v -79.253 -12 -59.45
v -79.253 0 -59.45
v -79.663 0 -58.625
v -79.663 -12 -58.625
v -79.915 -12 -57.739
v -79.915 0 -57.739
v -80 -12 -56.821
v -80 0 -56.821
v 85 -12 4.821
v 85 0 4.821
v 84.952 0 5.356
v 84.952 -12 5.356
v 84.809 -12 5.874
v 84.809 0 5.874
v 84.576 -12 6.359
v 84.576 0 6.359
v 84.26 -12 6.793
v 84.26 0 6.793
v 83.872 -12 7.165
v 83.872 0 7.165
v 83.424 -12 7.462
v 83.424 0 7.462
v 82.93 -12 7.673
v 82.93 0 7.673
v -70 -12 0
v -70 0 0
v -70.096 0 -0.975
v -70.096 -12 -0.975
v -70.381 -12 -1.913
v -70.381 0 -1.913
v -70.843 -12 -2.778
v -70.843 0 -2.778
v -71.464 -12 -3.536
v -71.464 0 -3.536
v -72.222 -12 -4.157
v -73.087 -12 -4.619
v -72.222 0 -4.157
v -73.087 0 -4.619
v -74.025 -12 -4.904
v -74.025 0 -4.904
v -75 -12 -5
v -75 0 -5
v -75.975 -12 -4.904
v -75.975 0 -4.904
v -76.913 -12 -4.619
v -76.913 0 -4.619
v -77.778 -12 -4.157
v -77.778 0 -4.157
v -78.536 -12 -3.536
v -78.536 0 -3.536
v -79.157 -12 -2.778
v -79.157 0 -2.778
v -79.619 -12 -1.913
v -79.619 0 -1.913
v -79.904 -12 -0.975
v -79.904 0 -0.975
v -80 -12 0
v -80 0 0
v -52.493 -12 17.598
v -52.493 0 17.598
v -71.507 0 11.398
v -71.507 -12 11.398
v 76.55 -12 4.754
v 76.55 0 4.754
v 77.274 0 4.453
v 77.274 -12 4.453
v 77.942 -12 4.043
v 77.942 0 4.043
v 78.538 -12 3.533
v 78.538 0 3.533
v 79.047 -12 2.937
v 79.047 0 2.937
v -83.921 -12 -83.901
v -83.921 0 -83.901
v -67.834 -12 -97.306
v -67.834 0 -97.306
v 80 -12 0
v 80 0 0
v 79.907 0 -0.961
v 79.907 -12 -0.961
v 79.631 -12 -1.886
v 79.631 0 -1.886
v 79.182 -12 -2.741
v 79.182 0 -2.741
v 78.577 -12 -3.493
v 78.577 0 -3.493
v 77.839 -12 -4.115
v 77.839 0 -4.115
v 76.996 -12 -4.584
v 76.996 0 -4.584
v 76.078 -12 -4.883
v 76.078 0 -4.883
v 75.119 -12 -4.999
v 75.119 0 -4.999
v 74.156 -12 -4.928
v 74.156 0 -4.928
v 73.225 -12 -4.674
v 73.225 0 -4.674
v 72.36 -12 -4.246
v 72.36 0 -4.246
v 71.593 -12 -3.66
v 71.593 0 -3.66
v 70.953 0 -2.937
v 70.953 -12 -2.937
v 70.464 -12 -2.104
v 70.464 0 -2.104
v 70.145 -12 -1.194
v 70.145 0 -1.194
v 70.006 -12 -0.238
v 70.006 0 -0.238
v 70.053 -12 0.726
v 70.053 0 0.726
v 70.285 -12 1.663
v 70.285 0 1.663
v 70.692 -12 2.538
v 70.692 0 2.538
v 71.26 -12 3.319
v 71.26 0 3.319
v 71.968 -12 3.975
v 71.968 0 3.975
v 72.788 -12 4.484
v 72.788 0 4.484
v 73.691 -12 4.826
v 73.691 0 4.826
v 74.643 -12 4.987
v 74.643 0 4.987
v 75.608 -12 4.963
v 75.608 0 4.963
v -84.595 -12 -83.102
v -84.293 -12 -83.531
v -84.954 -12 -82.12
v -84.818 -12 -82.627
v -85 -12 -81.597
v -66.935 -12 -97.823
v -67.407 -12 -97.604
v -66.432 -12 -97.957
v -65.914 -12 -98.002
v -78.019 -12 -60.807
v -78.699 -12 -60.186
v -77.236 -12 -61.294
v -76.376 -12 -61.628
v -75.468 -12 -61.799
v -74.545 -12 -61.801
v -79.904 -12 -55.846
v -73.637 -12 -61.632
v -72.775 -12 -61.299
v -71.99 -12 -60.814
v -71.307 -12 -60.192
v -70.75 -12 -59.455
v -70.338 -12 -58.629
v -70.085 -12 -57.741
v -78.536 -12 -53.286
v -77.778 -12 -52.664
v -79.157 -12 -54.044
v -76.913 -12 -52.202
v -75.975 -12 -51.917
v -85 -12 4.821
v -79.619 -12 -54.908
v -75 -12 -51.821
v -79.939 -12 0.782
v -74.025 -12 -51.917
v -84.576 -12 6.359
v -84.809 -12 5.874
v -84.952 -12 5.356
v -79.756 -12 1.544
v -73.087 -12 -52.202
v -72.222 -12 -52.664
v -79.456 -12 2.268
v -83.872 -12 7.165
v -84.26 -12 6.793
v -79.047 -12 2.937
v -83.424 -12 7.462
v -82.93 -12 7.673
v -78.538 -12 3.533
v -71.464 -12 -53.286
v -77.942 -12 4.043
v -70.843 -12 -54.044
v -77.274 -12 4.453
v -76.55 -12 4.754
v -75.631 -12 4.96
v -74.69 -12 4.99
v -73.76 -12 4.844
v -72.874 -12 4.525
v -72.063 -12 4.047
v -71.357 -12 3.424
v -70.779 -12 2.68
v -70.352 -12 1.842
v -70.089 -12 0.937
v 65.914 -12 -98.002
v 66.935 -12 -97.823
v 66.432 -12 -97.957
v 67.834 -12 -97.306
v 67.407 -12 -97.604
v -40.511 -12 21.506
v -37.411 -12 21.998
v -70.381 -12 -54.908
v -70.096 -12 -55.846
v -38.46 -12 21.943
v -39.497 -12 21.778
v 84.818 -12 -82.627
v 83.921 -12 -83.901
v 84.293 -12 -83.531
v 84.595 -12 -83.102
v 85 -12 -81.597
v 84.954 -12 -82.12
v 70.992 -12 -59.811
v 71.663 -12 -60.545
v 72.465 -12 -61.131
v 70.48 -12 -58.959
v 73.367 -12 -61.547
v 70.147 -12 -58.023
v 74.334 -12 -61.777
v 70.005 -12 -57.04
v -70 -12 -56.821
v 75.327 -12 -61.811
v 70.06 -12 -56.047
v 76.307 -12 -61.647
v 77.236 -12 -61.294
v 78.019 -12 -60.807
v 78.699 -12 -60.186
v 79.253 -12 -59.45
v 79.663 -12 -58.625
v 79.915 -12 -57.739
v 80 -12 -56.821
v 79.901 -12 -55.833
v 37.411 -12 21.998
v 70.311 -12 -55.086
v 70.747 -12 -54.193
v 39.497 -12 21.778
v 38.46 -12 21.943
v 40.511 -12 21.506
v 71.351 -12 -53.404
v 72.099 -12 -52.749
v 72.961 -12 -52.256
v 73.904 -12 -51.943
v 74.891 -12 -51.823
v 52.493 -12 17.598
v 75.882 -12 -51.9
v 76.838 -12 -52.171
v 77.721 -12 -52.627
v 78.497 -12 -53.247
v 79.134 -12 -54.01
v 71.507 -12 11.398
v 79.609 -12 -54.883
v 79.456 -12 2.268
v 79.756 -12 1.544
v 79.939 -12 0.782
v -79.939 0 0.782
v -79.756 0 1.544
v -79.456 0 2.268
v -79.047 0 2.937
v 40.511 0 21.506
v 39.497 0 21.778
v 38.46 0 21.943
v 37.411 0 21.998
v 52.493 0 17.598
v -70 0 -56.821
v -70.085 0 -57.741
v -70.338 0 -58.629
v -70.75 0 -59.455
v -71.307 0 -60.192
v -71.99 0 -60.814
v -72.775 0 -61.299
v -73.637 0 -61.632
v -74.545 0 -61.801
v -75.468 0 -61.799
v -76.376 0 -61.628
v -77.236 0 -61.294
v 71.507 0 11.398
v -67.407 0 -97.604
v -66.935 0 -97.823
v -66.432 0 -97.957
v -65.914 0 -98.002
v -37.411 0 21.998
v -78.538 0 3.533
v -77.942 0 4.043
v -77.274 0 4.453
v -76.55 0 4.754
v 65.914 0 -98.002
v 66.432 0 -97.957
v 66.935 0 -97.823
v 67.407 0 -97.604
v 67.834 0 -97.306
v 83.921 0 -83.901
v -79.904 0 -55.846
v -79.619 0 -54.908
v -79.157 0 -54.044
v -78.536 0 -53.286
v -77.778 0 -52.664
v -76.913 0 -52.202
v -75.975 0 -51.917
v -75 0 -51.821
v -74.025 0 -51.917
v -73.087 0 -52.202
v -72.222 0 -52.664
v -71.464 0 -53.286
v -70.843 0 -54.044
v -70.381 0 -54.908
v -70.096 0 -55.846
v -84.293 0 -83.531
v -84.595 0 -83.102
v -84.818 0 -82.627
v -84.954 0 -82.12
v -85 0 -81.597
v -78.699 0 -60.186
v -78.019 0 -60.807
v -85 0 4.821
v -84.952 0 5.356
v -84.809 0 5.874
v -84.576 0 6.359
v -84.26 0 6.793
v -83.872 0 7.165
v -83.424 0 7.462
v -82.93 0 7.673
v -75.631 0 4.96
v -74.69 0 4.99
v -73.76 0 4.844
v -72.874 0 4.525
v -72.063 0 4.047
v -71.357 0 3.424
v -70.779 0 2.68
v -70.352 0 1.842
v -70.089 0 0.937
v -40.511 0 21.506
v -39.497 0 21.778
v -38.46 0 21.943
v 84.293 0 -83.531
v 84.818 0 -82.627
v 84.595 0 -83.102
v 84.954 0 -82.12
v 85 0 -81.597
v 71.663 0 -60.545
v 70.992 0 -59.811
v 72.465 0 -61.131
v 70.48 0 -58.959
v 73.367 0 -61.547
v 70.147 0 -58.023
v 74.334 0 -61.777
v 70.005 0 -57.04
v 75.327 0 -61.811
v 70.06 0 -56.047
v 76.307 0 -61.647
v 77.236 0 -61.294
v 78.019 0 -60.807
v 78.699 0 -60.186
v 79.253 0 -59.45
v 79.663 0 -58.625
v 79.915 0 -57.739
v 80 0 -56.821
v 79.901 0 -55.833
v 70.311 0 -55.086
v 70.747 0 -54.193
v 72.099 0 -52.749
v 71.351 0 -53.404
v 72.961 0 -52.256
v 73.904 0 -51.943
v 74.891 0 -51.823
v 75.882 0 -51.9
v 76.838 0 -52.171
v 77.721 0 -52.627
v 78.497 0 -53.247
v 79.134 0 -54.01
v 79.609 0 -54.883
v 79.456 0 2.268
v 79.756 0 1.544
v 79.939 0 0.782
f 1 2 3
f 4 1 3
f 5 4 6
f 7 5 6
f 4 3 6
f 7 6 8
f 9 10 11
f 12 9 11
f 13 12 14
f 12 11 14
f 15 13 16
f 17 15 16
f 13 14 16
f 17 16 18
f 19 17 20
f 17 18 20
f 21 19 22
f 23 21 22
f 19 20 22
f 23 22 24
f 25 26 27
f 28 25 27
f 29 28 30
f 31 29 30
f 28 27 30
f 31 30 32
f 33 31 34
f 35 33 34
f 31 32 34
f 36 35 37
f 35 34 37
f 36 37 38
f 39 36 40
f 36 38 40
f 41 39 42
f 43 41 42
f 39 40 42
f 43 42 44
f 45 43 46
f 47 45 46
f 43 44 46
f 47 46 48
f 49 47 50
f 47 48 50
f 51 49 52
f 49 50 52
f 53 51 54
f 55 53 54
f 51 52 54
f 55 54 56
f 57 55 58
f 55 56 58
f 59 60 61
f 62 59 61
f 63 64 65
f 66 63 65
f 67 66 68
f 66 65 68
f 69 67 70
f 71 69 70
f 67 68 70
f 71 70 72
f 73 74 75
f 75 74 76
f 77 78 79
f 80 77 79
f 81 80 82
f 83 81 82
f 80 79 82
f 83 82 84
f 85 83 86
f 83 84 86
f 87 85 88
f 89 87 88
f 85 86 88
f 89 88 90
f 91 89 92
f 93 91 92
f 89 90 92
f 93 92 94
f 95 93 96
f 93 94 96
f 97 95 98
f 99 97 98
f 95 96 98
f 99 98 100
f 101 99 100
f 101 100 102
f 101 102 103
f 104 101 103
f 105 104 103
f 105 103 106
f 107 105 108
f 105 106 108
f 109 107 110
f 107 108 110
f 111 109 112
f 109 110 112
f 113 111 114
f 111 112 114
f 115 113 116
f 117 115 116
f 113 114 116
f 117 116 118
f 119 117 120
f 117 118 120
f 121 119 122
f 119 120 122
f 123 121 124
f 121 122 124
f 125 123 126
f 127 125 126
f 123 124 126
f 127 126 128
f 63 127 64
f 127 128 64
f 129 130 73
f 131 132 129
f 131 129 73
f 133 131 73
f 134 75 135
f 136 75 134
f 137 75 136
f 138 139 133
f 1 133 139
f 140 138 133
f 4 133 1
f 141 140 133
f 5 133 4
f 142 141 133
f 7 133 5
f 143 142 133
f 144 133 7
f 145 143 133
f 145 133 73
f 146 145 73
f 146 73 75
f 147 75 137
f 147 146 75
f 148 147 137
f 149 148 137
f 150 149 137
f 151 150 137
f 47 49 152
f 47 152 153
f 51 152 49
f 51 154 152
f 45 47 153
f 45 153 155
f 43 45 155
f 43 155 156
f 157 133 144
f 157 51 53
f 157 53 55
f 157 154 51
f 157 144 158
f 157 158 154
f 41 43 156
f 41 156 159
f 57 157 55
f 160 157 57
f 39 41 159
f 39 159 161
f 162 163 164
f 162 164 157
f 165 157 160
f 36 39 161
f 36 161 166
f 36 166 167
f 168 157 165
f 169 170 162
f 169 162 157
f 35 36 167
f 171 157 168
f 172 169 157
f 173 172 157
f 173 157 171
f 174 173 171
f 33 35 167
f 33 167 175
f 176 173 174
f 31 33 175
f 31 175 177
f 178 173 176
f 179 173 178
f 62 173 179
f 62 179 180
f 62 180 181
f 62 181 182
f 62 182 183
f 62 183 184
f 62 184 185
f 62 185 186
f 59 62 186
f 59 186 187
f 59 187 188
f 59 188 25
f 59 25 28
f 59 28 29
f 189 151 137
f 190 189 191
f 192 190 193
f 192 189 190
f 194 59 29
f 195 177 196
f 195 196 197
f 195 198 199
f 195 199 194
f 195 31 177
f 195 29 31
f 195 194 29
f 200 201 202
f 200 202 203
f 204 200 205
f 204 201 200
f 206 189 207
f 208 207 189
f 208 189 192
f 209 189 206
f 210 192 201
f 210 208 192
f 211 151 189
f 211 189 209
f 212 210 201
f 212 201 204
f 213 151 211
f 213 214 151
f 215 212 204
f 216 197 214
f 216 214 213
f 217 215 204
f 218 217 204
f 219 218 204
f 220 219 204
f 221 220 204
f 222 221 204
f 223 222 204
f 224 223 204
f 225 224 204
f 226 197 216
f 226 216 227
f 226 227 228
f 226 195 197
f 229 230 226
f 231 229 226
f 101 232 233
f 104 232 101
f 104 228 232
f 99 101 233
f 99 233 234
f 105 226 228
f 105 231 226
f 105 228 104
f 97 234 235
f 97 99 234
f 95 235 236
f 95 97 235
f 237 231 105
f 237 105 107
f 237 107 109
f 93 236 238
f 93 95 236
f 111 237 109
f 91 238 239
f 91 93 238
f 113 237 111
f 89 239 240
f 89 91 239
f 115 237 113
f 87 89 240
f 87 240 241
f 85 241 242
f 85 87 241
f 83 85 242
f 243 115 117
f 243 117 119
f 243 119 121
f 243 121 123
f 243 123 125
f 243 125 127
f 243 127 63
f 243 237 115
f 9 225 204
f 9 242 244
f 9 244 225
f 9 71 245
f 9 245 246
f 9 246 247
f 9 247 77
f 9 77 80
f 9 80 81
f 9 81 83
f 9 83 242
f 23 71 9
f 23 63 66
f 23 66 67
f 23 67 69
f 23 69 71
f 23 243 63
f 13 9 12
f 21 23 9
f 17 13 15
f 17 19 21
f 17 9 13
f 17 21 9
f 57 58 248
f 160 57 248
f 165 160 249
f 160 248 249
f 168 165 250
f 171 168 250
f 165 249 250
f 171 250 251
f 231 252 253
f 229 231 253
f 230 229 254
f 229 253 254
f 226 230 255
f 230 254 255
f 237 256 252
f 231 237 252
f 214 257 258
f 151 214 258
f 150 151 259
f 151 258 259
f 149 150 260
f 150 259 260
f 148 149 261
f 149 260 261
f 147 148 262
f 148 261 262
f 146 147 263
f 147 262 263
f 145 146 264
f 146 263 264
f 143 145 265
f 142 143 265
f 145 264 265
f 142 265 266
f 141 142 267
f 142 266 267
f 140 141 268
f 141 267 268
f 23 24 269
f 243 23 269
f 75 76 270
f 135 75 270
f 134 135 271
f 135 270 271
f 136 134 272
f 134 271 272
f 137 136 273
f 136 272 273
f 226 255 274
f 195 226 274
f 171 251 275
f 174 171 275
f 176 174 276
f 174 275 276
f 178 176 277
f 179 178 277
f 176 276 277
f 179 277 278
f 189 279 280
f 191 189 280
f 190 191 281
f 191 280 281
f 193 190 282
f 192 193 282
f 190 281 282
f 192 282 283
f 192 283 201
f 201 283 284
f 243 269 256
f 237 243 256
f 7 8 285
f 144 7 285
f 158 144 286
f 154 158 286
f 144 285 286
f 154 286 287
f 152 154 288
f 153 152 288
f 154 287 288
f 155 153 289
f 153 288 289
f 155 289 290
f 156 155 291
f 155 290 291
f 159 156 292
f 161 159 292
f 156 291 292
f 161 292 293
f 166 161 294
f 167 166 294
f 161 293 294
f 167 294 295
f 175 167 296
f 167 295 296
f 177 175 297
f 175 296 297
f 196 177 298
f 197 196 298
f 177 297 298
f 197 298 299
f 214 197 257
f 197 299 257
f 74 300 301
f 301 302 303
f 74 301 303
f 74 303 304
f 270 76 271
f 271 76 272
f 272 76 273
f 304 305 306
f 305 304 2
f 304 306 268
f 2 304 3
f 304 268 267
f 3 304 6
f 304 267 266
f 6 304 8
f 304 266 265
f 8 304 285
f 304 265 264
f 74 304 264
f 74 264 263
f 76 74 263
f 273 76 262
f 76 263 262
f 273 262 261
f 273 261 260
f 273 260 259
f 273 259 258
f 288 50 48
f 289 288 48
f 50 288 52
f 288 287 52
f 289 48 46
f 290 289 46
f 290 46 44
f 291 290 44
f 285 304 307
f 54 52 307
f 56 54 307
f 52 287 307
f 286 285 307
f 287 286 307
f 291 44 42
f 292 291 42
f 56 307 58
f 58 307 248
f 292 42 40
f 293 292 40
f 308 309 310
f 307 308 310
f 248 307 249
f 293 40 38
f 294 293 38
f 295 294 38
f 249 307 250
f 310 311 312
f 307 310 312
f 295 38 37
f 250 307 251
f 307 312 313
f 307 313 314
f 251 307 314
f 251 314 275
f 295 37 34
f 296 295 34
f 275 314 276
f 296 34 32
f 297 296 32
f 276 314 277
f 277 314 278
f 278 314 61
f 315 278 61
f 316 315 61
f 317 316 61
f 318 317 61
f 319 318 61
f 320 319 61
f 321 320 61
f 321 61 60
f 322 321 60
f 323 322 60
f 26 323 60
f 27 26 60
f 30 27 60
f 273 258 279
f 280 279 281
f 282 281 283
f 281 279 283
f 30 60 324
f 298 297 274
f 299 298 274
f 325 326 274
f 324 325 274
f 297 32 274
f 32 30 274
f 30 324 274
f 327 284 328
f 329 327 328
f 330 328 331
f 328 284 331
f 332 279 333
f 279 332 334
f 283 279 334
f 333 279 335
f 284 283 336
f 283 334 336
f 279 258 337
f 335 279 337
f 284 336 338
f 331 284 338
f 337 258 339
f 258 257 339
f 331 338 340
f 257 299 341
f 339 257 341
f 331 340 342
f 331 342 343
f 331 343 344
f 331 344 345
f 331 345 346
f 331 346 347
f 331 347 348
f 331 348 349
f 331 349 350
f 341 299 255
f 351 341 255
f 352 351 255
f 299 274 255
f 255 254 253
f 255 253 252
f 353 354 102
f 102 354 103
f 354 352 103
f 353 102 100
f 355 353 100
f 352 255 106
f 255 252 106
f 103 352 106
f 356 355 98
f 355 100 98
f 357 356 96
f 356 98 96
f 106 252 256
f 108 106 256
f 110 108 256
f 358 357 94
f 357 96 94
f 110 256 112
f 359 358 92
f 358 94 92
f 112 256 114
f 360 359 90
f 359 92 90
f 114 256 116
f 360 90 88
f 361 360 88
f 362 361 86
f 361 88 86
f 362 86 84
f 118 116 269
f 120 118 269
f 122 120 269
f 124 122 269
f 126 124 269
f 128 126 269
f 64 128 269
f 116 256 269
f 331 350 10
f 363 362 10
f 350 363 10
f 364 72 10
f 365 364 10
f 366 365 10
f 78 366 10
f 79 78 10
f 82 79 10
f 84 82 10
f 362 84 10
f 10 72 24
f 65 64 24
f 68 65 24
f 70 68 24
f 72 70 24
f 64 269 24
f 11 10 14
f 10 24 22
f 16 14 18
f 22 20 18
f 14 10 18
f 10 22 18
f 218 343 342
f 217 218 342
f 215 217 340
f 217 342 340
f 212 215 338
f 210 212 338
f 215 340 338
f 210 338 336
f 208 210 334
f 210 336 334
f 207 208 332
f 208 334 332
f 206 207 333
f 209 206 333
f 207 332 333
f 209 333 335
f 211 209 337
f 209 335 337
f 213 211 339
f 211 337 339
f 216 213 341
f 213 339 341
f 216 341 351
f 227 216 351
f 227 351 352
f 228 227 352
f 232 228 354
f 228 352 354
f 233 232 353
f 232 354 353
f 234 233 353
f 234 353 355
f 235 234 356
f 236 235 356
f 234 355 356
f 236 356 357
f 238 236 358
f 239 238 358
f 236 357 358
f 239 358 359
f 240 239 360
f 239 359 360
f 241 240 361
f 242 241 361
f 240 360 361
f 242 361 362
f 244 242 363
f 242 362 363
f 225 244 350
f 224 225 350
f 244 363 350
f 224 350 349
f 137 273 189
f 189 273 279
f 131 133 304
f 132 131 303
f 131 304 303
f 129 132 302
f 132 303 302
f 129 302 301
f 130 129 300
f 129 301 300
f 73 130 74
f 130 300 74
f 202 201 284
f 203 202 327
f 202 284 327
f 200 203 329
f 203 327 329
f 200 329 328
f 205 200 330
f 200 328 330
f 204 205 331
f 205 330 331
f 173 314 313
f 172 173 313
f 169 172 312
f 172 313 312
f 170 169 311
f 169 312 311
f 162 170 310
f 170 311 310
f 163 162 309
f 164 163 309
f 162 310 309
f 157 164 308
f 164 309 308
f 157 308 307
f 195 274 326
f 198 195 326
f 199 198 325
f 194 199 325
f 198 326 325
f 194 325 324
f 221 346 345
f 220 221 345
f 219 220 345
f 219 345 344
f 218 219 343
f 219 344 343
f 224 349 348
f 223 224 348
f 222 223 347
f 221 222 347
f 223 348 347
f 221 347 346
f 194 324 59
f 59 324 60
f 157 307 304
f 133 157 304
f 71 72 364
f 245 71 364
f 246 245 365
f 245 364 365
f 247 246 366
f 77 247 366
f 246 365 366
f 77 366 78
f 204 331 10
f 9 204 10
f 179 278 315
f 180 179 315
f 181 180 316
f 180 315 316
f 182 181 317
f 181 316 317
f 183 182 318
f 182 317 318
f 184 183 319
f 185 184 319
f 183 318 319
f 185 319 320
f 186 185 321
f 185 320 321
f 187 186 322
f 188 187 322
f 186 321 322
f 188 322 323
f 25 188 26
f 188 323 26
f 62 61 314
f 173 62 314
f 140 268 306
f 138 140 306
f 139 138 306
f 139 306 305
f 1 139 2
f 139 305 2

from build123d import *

# Parameters (mm, degrees)
F1_DEPTH = 12


with BuildPart() as f1:
    # F0 (on Front) → F1 (new body)
    with BuildSketch(Plane.XZ):
        with BuildLine():
            ThreePointArc((83.920553, -83.901291), (84.716768, -82.869093), (85, -81.596627))
            Line((85, -81.596627), (85, -63.001752))
            Line((85, -63.001752), (85, -43.001752))
            Line((85, -43.001752), (85, -23.001752))
            Line((85, -23.001752), (85, 1.998248))
            Line((85, 1.998248), (85, 4.821038))
            ThreePointArc((85, 4.821038), (84.427981, 6.583113), (82.930062, 7.673228))
            Line((82.930062, 7.673228), (71.507298, 11.398042))
            Line((71.507298, 11.398042), (62, 14.498248))
            Line((62, 14.498248), (52.492702, 17.598454))
            Line((52.492702, 17.598454), (40.510952, 21.505546))
            ThreePointArc((40.510952, 21.505546), (38.980302, 21.874305), (37.410746, 21.998248))
            Line((37.410746, 21.998248), (-37.410746, 21.998248))
            ThreePointArc((-37.410746, 21.998248), (-38.980302, 21.874305), (-40.510952, 21.505546))
            Line((-40.510952, 21.505546), (-52.492702, 17.598454))
            Line((-52.492702, 17.598454), (-62, 14.498248))
            Line((-62, 14.498248), (-71.507298, 11.398042))
            Line((-71.507298, 11.398042), (-82.930062, 7.673228))
            ThreePointArc((-82.930062, 7.673228), (-84.427981, 6.583113), (-85, 4.821038))
            Line((-85, 4.821038), (-85, 1.998248))
            Line((-85, 1.998248), (-85, -23.001752))
            Line((-85, -23.001752), (-85, -43.001752))
            Line((-85, -43.001752), (-85, -63.001752))
            Line((-85, -63.001752), (-85, -81.596627))
            ThreePointArc((-85, -81.596627), (-84.716768, -82.869093), (-83.920553, -83.901291))
            Line((-83.920553, -83.901291), (-67.834403, -97.306416))
            ThreePointArc((-67.834403, -97.306416), (-66.935126, -97.822567), (-65.91385, -98.001752))
            Line((-65.91385, -98.001752), (65.91385, -98.001752))
            ThreePointArc((65.91385, -98.001752), (66.935126, -97.822567), (67.834403, -97.306416))
            Line((67.834403, -97.306416), (83.920553, -83.901291))
        make_face()
        with BuildLine():
            ThreePointArc((38.990151, 16.936276), (39.376448, 16.859172), (39.755476, 16.751897))
            Line((39.755476, 16.751897), (76.550103, 4.753649))
            ThreePointArc((76.550103, 4.753649), (77.942127, 4.042757), (79.046635, 2.936791))
            ThreePointArc((79.046635, 2.936791), (79.75569, 1.54383), (80, 0))
            Line((80, 0), (80, -56.821412))
            ThreePointArc((80, -56.821412), (79.809692, -58.187745), (79.253254, -59.450068))
            ThreePointArc((79.253254, -59.450068), (78.373045, -60.512289), (77.236068, -61.293548))
            Line((77.236068, -61.293548), (24.875388, -87.473888))
            ThreePointArc((24.875388, -87.473888), (24.34317, -87.702486), (23.788085, -87.867997))
            ThreePointArc((23.788085, -87.867997), (23.217583, -87.968201), (22.63932, -88.001752))
            Line((22.63932, -88.001752), (0, -88.001752))
            Line((0, -88.001752), (-22.63932, -88.001752))
            ThreePointArc((-22.63932, -88.001752), (-23.217583, -87.968201), (-23.788085, -87.867997))
            ThreePointArc((-23.788085, -87.867997), (-24.34317, -87.702486), (-24.875388, -87.473888))
            Line((-24.875388, -87.473888), (-77.236068, -61.293548))
            ThreePointArc((-77.236068, -61.293548), (-78.373045, -60.512289), (-79.253254, -59.450068))
            ThreePointArc((-79.253254, -59.450068), (-79.809692, -58.187745), (-80, -56.821412))
            Line((-80, -56.821412), (-80, 0))
            ThreePointArc((-80, 0), (-79.75569, 1.54383), (-79.046635, 2.936791))
            ThreePointArc((-79.046635, 2.936791), (-77.942127, 4.042757), (-76.550103, 4.753649))
            Line((-76.550103, 4.753649), (-39.755476, 16.751897))
            ThreePointArc((-39.755476, 16.751897), (-39.376448, 16.859172), (-38.990151, 16.936276))
            ThreePointArc((-38.990151, 16.936276), (-38.598983, 16.982731), (-38.205373, 16.998248))
            Line((-38.205373, 16.998248), (0, 16.998248))
            Line((0, 16.998248), (38.205373, 16.998248))
            ThreePointArc((38.205373, 16.998248), (38.598983, 16.982731), (38.990151, 16.936276))
        make_face(mode=Mode.SUBTRACT)
        with BuildLine():
            Line((76.550103, 4.753649), (39.755476, 16.751897))
            ThreePointArc((39.755476, 16.751897), (39.376448, 16.859172), (38.990151, 16.936276))
            ThreePointArc((38.990151, 16.936276), (38.598983, 16.982731), (38.205373, 16.998248))
            Line((38.205373, 16.998248), (0, 16.998248))
            Line((0, 16.998248), (-38.205373, 16.998248))
            ThreePointArc((-38.205373, 16.998248), (-38.598983, 16.982731), (-38.990151, 16.936276))
            ThreePointArc((-38.990151, 16.936276), (-39.376448, 16.859172), (-39.755476, 16.751897))
            Line((-39.755476, 16.751897), (-76.550103, 4.753649))
            ThreePointArc((-76.550103, 4.753649), (-72.063209, 4.046635), (-70, 0))
            ThreePointArc((-70, 0), (-75, -5), (-80, 0))
            Line((-80, 0), (-80, -56.821412))
            ThreePointArc((-80, -56.821412), (-75, -51.821412), (-70, -56.821412))
            ThreePointArc((-70, -56.821412), (-72.371344, -61.074666), (-77.236068, -61.293548))
            Line((-77.236068, -61.293548), (-24.875388, -87.473888))
            ThreePointArc((-24.875388, -87.473888), (-24.34317, -87.702486), (-23.788085, -87.867997))
            ThreePointArc((-23.788085, -87.867997), (-23.217583, -87.968201), (-22.63932, -88.001752))
            Line((-22.63932, -88.001752), (0, -88.001752))
            Line((0, -88.001752), (22.63932, -88.001752))
            ThreePointArc((22.63932, -88.001752), (23.217583, -87.968201), (23.788085, -87.867997))
            ThreePointArc((23.788085, -87.867997), (24.34317, -87.702486), (24.875388, -87.473888))
            Line((24.875388, -87.473888), (77.236068, -61.293548))
            ThreePointArc((77.236068, -61.293548), (70.746746, -54.192757), (80, -56.821412))
            Line((80, -56.821412), (80, 0))
            ThreePointArc((80, 0), (70.953365, -2.936791), (76.550103, 4.753649))
        make_face()
    extrude(amount=F1_DEPTH)


solid = f1.part
